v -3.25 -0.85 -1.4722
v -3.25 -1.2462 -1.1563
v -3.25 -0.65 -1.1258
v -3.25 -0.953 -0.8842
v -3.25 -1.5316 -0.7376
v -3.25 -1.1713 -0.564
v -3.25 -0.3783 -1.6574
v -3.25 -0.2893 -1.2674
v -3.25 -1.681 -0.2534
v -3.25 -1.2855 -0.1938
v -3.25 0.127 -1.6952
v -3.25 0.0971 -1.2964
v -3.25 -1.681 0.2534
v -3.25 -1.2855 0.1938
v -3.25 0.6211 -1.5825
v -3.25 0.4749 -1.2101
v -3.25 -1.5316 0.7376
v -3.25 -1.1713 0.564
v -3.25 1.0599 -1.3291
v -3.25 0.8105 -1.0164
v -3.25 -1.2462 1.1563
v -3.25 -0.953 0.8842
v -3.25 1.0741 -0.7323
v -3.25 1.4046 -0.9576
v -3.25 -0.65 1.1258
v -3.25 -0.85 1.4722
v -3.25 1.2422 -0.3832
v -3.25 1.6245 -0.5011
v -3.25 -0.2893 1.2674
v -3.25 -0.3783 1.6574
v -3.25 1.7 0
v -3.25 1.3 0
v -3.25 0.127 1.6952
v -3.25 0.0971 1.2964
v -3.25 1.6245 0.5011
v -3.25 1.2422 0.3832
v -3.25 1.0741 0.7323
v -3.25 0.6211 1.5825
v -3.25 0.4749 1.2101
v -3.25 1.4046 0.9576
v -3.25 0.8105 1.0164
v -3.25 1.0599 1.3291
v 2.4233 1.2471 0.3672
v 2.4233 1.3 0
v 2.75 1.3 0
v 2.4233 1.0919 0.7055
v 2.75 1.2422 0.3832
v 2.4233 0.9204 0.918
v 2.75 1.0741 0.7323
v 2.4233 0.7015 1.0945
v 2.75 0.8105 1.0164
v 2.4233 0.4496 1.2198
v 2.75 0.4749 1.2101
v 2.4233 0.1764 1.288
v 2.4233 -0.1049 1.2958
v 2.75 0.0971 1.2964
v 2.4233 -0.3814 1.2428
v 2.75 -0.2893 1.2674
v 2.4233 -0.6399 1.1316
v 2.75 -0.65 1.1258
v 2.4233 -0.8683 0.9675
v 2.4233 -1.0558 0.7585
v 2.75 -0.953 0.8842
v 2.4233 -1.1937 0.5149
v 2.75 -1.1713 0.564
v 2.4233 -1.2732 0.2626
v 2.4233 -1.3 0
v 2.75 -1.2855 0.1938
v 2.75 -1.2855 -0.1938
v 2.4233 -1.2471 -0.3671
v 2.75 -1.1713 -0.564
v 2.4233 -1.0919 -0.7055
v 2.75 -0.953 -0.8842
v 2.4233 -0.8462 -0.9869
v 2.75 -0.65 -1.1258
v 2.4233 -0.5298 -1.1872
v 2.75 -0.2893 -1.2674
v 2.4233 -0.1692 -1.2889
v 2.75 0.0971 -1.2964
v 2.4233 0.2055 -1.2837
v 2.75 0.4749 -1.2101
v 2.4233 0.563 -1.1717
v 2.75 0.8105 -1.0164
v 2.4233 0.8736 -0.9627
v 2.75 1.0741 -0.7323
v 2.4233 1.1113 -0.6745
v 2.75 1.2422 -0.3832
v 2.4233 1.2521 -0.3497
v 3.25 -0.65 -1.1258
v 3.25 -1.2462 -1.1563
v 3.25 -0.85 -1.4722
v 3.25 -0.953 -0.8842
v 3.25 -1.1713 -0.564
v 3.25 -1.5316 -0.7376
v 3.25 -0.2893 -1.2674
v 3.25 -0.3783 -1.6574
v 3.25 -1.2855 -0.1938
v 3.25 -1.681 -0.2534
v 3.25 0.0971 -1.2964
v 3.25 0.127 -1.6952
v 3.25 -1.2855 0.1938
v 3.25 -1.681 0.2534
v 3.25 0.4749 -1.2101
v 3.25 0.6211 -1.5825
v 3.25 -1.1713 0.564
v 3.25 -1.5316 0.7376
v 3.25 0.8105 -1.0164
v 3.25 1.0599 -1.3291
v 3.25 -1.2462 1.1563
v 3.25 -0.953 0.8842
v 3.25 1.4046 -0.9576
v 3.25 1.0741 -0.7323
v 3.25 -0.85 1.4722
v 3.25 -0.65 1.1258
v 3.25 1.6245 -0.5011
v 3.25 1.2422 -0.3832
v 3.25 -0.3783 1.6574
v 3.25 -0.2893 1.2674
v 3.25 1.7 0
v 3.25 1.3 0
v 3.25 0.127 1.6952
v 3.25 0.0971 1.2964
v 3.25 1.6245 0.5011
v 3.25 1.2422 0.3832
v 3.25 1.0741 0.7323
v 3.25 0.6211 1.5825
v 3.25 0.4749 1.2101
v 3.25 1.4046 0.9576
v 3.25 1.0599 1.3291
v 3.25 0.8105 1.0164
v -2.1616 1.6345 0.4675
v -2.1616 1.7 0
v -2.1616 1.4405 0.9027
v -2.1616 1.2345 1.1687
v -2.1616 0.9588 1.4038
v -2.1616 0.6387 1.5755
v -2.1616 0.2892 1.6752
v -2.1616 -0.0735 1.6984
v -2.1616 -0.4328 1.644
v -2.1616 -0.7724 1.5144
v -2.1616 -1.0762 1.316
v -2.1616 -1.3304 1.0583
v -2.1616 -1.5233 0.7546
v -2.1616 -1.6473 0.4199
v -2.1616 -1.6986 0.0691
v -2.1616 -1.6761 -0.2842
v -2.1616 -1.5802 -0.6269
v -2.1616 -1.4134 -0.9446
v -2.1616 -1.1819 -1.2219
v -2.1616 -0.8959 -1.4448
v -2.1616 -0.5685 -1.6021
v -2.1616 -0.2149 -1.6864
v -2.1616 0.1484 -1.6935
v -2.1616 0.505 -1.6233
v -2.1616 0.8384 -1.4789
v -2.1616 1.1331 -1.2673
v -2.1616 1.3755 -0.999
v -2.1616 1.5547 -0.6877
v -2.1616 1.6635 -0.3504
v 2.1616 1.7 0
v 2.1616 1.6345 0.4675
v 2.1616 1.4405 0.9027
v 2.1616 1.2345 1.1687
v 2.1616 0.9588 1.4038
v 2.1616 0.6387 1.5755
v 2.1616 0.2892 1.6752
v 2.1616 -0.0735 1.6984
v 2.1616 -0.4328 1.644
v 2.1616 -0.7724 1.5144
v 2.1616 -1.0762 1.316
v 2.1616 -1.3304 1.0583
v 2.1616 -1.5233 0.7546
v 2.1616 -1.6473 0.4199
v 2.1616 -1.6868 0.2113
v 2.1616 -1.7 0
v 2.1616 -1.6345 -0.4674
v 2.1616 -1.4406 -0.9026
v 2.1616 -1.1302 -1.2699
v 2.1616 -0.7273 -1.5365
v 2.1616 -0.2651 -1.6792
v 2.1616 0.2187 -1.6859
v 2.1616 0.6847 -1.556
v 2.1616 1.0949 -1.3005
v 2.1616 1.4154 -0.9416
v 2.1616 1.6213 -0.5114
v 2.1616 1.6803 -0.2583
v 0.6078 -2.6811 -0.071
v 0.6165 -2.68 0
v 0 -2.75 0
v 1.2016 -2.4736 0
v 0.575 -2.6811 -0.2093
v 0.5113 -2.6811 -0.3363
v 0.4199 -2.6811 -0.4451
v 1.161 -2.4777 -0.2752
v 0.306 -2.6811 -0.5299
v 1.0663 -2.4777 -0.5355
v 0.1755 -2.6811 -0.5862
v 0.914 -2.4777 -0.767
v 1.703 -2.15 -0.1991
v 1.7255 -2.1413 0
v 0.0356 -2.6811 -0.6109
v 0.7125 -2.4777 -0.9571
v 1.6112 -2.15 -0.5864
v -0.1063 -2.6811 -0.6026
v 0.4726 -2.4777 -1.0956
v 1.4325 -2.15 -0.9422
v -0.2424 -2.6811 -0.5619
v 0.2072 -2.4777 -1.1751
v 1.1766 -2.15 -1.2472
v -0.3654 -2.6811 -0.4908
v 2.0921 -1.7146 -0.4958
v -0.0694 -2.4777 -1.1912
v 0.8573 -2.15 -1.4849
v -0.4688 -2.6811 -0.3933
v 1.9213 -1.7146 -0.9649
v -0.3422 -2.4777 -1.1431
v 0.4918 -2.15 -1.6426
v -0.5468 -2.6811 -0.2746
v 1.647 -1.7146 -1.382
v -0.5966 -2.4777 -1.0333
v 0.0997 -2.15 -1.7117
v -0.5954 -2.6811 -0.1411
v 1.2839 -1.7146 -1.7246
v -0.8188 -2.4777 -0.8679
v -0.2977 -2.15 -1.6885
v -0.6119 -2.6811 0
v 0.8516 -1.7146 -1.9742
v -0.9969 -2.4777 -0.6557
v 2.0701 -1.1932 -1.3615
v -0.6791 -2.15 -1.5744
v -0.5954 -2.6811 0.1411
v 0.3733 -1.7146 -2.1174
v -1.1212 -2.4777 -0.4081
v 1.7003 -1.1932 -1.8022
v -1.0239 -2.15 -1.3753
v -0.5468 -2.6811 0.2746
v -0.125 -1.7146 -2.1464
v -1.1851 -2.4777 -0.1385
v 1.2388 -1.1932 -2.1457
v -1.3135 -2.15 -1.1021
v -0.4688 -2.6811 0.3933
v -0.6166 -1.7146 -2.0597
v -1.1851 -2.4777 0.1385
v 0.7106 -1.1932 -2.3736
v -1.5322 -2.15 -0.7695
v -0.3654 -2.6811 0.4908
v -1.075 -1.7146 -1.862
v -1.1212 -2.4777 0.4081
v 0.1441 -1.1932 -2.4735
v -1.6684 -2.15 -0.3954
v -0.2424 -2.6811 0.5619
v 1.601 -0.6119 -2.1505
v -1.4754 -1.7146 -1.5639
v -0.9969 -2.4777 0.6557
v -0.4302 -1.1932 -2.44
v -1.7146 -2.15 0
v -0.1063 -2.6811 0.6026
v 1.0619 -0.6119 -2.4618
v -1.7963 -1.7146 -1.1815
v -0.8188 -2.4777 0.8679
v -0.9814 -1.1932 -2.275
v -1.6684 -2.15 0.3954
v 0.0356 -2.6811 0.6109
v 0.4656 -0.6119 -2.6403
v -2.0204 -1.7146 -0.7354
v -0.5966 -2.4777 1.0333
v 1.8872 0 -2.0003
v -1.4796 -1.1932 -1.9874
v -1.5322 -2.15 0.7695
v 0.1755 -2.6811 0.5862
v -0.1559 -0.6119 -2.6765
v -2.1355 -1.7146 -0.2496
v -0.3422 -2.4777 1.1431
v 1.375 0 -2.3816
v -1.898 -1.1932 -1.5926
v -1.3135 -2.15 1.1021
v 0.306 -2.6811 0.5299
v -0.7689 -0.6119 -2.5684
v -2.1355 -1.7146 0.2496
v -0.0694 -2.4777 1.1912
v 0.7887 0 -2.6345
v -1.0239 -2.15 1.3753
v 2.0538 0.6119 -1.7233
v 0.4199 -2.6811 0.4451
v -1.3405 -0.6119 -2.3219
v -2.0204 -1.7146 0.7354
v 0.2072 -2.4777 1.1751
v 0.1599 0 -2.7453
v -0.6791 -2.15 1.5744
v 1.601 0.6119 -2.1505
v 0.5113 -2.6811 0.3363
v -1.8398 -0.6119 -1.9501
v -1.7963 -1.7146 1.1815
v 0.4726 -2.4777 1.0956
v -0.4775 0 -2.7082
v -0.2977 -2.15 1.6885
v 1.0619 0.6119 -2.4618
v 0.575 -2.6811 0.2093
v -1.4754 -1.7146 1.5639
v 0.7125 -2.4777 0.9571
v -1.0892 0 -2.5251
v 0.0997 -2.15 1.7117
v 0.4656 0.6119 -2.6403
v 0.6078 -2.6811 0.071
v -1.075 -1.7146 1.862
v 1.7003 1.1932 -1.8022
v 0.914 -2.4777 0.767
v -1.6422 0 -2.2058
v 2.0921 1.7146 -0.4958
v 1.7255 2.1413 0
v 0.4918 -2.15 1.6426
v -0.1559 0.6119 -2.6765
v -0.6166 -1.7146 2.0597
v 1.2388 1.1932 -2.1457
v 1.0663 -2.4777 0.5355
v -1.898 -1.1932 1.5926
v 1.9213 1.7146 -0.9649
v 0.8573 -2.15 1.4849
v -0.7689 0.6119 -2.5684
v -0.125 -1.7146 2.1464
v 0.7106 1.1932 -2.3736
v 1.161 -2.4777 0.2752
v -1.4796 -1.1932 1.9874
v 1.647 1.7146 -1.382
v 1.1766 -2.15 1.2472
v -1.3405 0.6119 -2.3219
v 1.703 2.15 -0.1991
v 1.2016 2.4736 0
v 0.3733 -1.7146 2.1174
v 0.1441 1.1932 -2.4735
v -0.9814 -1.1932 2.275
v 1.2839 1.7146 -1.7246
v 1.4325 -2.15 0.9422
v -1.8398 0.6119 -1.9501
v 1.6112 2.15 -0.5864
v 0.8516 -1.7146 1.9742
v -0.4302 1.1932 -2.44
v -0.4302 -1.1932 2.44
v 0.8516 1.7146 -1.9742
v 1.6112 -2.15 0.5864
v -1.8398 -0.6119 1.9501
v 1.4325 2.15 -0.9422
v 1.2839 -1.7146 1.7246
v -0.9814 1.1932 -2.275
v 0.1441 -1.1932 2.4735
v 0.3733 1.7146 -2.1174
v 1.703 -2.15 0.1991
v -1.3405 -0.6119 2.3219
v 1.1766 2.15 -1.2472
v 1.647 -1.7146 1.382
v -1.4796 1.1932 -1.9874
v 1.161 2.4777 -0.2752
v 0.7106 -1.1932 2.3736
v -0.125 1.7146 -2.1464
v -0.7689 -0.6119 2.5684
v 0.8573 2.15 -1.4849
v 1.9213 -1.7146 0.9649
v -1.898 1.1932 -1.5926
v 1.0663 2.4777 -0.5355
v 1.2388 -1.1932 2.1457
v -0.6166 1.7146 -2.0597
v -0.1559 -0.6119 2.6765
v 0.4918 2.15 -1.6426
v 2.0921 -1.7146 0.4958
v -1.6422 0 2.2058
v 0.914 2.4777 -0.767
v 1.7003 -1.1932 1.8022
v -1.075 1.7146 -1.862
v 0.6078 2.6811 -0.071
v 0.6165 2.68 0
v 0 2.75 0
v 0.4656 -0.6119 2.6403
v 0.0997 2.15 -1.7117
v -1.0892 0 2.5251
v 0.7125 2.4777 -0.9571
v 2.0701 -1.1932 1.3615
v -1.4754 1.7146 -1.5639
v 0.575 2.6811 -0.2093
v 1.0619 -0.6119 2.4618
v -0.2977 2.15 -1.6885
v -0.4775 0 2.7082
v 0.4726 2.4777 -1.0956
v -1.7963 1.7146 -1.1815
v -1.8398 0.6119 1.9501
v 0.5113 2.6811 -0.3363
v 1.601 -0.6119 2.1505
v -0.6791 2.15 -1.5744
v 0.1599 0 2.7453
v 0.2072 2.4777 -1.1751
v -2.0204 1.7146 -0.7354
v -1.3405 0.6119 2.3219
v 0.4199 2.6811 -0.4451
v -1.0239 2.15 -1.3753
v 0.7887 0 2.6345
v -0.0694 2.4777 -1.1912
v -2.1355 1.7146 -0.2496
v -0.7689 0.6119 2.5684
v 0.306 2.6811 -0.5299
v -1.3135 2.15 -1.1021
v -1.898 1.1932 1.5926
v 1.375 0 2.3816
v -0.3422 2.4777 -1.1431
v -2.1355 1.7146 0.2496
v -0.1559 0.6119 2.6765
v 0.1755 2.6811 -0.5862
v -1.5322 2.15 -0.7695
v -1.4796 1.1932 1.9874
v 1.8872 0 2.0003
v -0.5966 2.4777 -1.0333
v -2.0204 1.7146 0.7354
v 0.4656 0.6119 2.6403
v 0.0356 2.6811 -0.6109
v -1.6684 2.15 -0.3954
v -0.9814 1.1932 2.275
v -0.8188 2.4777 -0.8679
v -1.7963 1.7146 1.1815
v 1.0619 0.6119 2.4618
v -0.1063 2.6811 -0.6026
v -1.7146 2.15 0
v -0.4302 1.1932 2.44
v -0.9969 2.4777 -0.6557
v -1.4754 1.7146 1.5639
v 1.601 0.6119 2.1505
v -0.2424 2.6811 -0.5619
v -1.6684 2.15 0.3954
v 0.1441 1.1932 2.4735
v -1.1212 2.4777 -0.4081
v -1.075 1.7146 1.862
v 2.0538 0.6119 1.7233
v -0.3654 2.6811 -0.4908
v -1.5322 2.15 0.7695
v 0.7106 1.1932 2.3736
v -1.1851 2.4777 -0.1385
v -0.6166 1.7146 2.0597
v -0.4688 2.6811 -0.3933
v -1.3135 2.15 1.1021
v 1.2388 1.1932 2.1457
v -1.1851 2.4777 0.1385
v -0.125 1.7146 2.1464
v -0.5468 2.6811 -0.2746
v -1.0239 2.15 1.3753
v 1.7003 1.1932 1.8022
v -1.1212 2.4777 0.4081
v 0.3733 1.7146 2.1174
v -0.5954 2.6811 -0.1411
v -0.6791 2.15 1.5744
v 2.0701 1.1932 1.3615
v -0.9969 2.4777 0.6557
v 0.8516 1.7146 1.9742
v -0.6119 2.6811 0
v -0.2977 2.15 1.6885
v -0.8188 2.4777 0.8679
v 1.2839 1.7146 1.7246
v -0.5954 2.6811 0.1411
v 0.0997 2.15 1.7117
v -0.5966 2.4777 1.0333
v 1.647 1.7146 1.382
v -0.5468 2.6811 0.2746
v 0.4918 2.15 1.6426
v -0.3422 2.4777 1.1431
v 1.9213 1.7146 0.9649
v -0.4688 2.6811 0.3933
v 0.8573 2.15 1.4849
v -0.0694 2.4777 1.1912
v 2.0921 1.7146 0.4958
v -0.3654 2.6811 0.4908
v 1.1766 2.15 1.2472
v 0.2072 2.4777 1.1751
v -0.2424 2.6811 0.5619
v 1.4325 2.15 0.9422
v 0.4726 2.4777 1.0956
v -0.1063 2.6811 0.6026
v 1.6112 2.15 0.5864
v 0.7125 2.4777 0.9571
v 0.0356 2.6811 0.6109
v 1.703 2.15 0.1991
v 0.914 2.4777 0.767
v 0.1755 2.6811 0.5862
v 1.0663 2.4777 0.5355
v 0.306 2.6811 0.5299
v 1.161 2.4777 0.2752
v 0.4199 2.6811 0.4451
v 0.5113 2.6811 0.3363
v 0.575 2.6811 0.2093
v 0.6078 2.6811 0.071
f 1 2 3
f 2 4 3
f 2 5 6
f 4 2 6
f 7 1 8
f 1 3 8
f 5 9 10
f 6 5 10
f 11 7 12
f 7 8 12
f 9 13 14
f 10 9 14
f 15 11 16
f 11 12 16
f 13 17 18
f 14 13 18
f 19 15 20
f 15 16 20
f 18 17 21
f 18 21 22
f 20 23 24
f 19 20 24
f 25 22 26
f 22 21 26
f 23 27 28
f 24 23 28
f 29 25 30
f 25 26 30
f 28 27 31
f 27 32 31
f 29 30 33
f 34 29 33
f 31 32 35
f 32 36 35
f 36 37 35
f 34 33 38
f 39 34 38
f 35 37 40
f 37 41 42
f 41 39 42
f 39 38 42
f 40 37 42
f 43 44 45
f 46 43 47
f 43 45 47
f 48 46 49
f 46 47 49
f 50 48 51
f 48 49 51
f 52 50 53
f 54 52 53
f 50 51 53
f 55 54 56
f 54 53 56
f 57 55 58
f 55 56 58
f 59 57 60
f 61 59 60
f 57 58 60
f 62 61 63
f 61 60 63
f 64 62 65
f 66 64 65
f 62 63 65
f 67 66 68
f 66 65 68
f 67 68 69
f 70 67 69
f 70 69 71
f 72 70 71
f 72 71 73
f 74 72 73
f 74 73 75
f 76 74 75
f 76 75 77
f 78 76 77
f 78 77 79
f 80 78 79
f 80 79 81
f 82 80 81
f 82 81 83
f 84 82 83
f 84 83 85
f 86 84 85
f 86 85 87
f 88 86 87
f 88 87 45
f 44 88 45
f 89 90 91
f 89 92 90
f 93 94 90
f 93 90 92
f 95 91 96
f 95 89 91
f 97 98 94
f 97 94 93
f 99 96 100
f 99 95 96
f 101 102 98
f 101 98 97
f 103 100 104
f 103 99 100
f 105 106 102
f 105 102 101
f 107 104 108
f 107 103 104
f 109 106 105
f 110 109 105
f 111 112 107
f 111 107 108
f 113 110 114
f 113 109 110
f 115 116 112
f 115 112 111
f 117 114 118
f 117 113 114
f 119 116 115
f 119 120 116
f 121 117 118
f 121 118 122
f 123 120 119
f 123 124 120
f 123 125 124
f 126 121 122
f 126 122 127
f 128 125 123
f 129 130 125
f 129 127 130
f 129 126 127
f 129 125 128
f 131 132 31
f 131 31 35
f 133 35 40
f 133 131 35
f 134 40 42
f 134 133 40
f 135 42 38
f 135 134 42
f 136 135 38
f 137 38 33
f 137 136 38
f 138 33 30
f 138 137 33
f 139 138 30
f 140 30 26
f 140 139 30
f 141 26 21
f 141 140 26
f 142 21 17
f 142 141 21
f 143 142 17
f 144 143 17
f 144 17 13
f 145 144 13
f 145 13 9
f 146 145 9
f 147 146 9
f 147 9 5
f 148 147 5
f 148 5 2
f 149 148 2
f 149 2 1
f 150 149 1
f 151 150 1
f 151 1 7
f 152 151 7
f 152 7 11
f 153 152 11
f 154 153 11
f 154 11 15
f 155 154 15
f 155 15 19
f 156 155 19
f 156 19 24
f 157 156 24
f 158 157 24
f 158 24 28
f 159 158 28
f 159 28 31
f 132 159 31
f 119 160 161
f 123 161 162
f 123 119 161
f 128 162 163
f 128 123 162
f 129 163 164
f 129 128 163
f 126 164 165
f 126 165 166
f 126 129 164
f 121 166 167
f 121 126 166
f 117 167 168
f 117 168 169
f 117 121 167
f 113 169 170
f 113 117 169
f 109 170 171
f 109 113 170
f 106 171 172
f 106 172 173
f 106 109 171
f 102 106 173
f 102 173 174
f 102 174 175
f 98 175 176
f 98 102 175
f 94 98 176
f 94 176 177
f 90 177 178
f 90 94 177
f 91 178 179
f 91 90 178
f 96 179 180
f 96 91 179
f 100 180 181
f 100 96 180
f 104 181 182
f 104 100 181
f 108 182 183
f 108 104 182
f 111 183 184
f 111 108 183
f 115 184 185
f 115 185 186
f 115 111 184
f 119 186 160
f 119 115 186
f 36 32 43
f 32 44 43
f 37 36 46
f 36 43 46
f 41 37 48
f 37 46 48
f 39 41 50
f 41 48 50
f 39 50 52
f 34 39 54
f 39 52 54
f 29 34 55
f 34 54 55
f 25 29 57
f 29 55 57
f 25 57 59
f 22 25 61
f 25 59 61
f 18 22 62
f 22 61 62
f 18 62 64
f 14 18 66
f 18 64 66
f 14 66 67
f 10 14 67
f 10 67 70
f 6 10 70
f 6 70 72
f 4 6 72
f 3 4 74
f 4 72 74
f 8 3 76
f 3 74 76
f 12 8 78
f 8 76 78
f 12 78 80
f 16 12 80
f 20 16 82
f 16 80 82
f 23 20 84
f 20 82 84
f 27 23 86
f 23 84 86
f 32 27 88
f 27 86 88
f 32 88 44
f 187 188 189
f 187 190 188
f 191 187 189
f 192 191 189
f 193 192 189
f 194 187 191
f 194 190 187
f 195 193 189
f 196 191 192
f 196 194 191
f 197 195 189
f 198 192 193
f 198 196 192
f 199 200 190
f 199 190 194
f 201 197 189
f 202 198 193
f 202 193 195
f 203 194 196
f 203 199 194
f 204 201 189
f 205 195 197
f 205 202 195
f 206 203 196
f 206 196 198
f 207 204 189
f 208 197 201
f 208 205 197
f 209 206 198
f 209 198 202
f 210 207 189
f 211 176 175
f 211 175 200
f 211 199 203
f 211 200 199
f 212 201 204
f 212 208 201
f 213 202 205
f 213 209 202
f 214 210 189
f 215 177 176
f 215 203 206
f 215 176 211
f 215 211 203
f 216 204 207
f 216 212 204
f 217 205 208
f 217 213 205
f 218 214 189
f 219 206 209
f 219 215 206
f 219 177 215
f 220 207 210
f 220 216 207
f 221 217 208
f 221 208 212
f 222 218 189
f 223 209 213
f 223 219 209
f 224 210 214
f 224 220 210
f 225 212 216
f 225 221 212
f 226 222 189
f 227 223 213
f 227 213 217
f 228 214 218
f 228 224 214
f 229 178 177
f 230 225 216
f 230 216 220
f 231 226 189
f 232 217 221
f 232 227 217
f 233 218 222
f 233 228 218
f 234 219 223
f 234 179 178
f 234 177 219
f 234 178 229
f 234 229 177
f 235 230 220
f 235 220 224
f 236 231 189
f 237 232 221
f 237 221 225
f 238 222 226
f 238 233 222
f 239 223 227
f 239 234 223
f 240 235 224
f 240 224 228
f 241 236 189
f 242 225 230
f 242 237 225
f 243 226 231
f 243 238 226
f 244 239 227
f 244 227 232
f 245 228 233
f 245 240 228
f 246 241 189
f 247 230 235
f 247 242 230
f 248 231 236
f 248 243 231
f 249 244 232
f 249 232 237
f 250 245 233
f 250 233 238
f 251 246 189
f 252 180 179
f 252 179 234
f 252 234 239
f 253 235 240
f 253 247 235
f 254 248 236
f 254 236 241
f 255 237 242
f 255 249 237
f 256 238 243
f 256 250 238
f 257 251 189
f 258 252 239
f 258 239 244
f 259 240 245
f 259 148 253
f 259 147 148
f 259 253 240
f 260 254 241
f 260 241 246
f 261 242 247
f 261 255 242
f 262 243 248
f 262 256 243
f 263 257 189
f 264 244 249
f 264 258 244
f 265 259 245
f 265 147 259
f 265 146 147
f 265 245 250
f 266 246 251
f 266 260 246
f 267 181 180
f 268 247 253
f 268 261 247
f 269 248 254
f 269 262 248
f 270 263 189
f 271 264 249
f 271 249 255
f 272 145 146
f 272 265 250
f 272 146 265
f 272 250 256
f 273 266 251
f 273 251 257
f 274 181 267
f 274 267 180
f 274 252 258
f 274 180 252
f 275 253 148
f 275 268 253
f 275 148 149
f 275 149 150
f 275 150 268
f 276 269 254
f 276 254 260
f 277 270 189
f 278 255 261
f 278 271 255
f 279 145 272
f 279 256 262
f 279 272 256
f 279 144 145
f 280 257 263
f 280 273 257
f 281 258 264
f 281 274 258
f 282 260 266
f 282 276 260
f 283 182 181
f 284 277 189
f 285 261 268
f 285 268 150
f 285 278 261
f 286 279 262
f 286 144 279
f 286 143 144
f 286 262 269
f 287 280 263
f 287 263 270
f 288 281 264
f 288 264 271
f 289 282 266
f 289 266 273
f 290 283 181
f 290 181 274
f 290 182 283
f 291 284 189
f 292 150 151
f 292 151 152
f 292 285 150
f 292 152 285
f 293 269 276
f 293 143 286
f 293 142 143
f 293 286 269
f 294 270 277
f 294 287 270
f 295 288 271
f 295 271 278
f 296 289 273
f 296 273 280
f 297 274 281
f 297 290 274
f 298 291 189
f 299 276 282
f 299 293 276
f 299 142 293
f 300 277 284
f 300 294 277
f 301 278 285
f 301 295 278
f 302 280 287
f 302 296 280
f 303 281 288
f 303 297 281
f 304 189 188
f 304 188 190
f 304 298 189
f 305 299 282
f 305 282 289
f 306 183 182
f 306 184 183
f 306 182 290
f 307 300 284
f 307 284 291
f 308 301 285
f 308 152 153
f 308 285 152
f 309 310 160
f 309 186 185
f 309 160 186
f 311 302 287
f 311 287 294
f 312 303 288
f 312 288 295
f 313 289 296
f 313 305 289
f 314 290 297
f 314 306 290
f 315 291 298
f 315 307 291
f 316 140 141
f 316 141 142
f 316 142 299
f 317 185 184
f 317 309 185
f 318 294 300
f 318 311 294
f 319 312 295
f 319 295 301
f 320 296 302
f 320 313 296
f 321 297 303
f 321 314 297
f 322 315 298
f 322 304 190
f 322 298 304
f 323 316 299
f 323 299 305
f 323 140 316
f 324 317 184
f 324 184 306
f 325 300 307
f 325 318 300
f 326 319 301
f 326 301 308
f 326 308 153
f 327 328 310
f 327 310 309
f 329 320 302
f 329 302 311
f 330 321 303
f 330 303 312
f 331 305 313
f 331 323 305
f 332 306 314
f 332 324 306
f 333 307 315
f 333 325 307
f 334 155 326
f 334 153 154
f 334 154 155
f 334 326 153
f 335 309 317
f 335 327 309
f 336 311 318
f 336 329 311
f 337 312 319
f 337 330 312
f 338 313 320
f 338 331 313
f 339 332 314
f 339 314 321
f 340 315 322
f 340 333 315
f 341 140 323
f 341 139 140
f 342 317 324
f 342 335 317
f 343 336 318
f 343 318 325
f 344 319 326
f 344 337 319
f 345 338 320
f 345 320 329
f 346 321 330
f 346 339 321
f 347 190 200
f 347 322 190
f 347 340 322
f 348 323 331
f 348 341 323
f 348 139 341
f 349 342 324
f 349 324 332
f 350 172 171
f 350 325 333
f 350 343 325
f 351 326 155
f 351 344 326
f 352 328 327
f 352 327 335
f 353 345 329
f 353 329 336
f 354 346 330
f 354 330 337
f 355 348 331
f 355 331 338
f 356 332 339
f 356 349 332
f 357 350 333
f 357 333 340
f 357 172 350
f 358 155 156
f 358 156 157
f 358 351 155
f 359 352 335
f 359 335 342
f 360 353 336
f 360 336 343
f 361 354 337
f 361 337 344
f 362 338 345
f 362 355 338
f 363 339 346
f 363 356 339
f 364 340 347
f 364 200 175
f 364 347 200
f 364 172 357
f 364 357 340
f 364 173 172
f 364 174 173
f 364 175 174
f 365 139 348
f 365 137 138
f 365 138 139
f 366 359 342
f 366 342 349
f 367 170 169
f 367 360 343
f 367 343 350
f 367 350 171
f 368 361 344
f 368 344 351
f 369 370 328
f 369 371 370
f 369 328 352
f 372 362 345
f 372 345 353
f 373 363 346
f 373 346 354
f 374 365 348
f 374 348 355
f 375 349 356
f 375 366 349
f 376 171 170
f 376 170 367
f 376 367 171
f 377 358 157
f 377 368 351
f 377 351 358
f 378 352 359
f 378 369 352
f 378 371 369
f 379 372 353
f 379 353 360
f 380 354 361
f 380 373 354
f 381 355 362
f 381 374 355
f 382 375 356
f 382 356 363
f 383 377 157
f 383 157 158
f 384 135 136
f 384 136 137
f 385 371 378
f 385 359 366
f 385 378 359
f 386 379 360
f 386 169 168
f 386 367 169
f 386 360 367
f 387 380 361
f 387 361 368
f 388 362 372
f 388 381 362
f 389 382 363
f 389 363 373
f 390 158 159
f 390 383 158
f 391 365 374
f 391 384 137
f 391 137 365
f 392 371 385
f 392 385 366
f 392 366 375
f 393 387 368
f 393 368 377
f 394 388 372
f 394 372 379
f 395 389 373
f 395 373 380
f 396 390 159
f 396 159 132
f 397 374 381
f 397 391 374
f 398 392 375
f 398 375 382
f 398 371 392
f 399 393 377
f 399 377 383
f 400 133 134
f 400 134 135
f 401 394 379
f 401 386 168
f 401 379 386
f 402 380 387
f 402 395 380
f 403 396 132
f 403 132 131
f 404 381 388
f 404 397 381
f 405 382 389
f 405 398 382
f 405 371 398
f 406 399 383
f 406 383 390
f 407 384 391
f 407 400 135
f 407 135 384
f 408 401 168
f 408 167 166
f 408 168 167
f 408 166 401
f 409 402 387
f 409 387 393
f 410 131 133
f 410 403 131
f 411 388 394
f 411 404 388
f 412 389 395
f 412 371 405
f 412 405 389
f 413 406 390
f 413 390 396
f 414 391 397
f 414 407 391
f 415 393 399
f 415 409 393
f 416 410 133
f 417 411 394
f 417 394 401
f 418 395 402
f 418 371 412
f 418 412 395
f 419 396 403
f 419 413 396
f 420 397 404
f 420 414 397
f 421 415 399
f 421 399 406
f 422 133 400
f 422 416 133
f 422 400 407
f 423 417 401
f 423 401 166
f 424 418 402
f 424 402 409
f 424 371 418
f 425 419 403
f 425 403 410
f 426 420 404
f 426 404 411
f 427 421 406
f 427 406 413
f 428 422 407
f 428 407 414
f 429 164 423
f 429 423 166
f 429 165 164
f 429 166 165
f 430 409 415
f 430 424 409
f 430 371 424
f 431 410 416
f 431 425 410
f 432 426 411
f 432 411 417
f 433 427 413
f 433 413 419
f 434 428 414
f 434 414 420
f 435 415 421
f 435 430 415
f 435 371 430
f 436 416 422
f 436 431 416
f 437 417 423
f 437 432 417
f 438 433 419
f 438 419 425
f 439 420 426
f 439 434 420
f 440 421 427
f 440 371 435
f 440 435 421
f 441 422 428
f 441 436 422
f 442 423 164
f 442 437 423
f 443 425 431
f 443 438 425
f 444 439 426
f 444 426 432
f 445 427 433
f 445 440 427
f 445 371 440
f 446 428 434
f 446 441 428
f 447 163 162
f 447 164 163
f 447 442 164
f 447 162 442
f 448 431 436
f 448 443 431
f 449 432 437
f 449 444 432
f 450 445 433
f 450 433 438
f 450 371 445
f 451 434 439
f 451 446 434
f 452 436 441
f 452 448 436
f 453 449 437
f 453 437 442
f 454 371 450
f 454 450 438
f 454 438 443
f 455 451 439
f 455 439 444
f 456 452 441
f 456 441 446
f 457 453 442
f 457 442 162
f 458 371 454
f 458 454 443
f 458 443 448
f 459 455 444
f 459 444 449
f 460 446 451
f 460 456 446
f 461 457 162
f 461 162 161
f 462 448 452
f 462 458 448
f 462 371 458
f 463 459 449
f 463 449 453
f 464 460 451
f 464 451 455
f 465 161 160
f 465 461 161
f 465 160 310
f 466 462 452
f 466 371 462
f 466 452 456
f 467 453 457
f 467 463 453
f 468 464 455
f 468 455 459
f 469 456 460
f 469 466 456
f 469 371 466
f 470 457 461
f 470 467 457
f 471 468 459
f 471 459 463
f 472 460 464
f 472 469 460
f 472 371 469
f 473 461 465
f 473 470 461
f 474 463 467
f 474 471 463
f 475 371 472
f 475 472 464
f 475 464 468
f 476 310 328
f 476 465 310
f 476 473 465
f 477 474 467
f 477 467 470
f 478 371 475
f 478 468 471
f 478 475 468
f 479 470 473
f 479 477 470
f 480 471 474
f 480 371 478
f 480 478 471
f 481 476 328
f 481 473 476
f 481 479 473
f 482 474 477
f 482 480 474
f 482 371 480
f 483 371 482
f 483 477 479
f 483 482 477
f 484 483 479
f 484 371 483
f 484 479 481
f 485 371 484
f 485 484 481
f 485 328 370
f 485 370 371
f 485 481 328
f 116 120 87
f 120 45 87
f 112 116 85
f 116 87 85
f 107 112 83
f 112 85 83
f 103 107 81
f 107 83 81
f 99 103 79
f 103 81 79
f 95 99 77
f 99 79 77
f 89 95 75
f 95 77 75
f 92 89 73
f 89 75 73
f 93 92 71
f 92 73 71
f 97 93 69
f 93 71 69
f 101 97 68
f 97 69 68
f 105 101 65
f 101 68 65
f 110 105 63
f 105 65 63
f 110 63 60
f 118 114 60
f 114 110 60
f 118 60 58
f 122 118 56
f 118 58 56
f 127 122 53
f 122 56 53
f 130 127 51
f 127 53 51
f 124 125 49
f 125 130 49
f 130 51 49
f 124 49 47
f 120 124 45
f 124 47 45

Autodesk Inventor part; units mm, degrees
sketch "Boceto1" plane through (0, 0, 0) normal (0, 0, 1) x (1, 0, 0)
  arc A0 (0, -2.75) -> (0, 2.75) centre (0, 0) ccw
  line L0 (0, 2.75) -> (0, -2.75)
  dimension "d0" = 5.5
revolve "Revolución1" add sketch "Boceto1" angle 360 about axis through (0, 2.75, 0) along (0, -1, 0)
ref_plane "Plano de trabajo2" through (2.75, 0, 0) normal (1, 0, 0) x (0, 1, 0)
ref_plane "Plano de trabajo3" through (-2.75, 0, 0) normal (1, 0, 0) x (0, 1, 0)
sketch "Boceto7" plane through (2.75, 0, 0) normal (1, 0, 0) x (0, 1, 0)
  circle A0 centre (0, 0) radius 1.7
  circle A1 centre (0, 0) radius 1.3
  dimension "d21" = 3.4
  dimension "d22" = 0.4
extrude "Extrusión5" add sketch "Boceto7" along normal blind 0.5 and the other way blind 1
sketch "Boceto8" plane through (-2.75, 0, 0) normal (1, 0, 0) x (0, 1, 0)
  circle A0 centre (0, 0) radius 1.7
  circle A1 centre (0, 0) radius 1.7 projected
  circle A2 centre (0, 0) radius 1.3
  dimension "d27" = 3.4
  dimension "d35" = 2.6
extrude "Extrusión6" add sketch "Boceto8" along normal blind 1 and the other way blind 0.5 contours A0 | A2
ref_plane "Plano de trabajo6" through (2.75, 0, 0) normal (1, 0, 0) x (0, 1, 0)
sketch "Boceto10" plane through (2.75, 0, 0) normal (1, 0, 0) x (0, 1, 0)
  circle A0 centre (0, 0) radius 1.3 projected
extrude "Extrusión8" cut sketch "Boceto10" against normal blind 10
properties part number "Bola chica" material "Aluminio 6061"
